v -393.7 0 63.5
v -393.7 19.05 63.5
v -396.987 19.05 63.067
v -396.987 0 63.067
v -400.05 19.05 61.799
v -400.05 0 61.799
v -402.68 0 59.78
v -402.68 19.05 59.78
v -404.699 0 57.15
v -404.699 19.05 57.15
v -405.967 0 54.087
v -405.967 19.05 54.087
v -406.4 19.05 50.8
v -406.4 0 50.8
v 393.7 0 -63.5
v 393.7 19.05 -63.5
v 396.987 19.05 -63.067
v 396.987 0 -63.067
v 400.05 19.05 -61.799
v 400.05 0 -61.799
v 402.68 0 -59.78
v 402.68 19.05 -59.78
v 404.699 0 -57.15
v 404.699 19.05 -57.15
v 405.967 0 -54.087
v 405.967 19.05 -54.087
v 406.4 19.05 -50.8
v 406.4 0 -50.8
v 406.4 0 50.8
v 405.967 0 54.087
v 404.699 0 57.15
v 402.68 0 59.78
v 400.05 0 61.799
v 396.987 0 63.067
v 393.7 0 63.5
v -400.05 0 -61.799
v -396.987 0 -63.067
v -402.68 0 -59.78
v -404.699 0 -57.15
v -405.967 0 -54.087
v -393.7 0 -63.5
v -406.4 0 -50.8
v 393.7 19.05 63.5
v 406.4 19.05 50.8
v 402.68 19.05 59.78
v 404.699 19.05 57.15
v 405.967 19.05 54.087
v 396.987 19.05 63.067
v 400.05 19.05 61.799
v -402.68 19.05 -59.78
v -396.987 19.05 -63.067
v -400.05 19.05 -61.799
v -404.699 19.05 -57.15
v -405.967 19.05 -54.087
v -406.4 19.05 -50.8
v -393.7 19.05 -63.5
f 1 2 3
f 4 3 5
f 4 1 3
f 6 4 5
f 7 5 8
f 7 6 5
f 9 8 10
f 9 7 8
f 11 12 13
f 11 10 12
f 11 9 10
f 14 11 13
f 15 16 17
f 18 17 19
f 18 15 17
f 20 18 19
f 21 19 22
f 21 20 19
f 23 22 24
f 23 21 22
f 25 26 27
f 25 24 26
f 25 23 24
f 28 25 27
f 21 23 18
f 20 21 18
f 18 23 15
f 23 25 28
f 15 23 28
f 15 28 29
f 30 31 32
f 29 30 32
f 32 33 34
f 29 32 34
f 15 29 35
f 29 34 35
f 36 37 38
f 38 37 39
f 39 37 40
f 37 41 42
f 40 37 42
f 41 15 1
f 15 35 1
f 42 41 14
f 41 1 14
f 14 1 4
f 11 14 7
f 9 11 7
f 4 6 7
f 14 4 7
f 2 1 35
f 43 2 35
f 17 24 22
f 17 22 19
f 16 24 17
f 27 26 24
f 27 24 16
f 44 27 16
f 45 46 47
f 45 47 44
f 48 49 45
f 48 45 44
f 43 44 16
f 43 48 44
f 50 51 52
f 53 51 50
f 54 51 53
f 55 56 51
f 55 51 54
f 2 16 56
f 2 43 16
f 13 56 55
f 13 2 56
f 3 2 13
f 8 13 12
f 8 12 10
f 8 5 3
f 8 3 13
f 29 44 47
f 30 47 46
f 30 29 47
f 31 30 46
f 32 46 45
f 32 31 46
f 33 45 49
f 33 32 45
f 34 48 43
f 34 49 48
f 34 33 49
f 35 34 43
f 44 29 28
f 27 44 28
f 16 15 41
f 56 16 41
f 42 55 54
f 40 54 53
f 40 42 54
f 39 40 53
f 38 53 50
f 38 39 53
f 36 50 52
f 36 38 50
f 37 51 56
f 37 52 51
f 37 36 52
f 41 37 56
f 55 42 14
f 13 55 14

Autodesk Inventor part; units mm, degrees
ref_plane "YZ Plane" through (0, 0, 0) normal (1, 0, 0) x (0, 1, 0)
ref_plane "XZ Plane" through (0, 0, 0) normal (0, 1, 0) x (-1, 0, 0)
ref_plane "XY Plane" through (0, 0, 0) normal (0, 0, 1) x (1, 0, 0)
sketch "Sketch1" plane through (0, 0, 0) normal (0, 1, 0) x (-1, 0, 0)
  line L0 (393.7, 63.5) -> (-393.7, 63.5)
  line L1 (-406.4, 50.8) -> (-406.4, -50.8)
  line L2 (-393.7, -63.5) -> (393.7, -63.5)
  line L3 (406.4, -50.8) -> (406.4, 50.8)
  line L4 (406.4, 63.5) -> (-406.4, -63.5) construction
  line L5 (-406.4, 63.5) -> (406.4, -63.5) construction
  arc A0 (393.7, -63.5) -> (406.4, -50.8) centre (393.7, -50.8) ccw
  arc A1 (406.4, 50.8) -> (393.7, 63.5) centre (393.7, 50.8) ccw
  arc A2 (-393.7, 63.5) -> (-406.4, 50.8) centre (-393.7, 50.8) ccw
  arc A3 (-406.4, -50.8) -> (-393.7, -63.5) centre (-393.7, -50.8) ccw
  point P0 (0, 0)
  dimension "d0" = 812.8
  dimension "d1" = 127
  dimension "d2" = 12.7
extrude "Extrusion1" add sketch "Sketch1" along normal blind 19.05
properties part number "BumperWoodLong"
